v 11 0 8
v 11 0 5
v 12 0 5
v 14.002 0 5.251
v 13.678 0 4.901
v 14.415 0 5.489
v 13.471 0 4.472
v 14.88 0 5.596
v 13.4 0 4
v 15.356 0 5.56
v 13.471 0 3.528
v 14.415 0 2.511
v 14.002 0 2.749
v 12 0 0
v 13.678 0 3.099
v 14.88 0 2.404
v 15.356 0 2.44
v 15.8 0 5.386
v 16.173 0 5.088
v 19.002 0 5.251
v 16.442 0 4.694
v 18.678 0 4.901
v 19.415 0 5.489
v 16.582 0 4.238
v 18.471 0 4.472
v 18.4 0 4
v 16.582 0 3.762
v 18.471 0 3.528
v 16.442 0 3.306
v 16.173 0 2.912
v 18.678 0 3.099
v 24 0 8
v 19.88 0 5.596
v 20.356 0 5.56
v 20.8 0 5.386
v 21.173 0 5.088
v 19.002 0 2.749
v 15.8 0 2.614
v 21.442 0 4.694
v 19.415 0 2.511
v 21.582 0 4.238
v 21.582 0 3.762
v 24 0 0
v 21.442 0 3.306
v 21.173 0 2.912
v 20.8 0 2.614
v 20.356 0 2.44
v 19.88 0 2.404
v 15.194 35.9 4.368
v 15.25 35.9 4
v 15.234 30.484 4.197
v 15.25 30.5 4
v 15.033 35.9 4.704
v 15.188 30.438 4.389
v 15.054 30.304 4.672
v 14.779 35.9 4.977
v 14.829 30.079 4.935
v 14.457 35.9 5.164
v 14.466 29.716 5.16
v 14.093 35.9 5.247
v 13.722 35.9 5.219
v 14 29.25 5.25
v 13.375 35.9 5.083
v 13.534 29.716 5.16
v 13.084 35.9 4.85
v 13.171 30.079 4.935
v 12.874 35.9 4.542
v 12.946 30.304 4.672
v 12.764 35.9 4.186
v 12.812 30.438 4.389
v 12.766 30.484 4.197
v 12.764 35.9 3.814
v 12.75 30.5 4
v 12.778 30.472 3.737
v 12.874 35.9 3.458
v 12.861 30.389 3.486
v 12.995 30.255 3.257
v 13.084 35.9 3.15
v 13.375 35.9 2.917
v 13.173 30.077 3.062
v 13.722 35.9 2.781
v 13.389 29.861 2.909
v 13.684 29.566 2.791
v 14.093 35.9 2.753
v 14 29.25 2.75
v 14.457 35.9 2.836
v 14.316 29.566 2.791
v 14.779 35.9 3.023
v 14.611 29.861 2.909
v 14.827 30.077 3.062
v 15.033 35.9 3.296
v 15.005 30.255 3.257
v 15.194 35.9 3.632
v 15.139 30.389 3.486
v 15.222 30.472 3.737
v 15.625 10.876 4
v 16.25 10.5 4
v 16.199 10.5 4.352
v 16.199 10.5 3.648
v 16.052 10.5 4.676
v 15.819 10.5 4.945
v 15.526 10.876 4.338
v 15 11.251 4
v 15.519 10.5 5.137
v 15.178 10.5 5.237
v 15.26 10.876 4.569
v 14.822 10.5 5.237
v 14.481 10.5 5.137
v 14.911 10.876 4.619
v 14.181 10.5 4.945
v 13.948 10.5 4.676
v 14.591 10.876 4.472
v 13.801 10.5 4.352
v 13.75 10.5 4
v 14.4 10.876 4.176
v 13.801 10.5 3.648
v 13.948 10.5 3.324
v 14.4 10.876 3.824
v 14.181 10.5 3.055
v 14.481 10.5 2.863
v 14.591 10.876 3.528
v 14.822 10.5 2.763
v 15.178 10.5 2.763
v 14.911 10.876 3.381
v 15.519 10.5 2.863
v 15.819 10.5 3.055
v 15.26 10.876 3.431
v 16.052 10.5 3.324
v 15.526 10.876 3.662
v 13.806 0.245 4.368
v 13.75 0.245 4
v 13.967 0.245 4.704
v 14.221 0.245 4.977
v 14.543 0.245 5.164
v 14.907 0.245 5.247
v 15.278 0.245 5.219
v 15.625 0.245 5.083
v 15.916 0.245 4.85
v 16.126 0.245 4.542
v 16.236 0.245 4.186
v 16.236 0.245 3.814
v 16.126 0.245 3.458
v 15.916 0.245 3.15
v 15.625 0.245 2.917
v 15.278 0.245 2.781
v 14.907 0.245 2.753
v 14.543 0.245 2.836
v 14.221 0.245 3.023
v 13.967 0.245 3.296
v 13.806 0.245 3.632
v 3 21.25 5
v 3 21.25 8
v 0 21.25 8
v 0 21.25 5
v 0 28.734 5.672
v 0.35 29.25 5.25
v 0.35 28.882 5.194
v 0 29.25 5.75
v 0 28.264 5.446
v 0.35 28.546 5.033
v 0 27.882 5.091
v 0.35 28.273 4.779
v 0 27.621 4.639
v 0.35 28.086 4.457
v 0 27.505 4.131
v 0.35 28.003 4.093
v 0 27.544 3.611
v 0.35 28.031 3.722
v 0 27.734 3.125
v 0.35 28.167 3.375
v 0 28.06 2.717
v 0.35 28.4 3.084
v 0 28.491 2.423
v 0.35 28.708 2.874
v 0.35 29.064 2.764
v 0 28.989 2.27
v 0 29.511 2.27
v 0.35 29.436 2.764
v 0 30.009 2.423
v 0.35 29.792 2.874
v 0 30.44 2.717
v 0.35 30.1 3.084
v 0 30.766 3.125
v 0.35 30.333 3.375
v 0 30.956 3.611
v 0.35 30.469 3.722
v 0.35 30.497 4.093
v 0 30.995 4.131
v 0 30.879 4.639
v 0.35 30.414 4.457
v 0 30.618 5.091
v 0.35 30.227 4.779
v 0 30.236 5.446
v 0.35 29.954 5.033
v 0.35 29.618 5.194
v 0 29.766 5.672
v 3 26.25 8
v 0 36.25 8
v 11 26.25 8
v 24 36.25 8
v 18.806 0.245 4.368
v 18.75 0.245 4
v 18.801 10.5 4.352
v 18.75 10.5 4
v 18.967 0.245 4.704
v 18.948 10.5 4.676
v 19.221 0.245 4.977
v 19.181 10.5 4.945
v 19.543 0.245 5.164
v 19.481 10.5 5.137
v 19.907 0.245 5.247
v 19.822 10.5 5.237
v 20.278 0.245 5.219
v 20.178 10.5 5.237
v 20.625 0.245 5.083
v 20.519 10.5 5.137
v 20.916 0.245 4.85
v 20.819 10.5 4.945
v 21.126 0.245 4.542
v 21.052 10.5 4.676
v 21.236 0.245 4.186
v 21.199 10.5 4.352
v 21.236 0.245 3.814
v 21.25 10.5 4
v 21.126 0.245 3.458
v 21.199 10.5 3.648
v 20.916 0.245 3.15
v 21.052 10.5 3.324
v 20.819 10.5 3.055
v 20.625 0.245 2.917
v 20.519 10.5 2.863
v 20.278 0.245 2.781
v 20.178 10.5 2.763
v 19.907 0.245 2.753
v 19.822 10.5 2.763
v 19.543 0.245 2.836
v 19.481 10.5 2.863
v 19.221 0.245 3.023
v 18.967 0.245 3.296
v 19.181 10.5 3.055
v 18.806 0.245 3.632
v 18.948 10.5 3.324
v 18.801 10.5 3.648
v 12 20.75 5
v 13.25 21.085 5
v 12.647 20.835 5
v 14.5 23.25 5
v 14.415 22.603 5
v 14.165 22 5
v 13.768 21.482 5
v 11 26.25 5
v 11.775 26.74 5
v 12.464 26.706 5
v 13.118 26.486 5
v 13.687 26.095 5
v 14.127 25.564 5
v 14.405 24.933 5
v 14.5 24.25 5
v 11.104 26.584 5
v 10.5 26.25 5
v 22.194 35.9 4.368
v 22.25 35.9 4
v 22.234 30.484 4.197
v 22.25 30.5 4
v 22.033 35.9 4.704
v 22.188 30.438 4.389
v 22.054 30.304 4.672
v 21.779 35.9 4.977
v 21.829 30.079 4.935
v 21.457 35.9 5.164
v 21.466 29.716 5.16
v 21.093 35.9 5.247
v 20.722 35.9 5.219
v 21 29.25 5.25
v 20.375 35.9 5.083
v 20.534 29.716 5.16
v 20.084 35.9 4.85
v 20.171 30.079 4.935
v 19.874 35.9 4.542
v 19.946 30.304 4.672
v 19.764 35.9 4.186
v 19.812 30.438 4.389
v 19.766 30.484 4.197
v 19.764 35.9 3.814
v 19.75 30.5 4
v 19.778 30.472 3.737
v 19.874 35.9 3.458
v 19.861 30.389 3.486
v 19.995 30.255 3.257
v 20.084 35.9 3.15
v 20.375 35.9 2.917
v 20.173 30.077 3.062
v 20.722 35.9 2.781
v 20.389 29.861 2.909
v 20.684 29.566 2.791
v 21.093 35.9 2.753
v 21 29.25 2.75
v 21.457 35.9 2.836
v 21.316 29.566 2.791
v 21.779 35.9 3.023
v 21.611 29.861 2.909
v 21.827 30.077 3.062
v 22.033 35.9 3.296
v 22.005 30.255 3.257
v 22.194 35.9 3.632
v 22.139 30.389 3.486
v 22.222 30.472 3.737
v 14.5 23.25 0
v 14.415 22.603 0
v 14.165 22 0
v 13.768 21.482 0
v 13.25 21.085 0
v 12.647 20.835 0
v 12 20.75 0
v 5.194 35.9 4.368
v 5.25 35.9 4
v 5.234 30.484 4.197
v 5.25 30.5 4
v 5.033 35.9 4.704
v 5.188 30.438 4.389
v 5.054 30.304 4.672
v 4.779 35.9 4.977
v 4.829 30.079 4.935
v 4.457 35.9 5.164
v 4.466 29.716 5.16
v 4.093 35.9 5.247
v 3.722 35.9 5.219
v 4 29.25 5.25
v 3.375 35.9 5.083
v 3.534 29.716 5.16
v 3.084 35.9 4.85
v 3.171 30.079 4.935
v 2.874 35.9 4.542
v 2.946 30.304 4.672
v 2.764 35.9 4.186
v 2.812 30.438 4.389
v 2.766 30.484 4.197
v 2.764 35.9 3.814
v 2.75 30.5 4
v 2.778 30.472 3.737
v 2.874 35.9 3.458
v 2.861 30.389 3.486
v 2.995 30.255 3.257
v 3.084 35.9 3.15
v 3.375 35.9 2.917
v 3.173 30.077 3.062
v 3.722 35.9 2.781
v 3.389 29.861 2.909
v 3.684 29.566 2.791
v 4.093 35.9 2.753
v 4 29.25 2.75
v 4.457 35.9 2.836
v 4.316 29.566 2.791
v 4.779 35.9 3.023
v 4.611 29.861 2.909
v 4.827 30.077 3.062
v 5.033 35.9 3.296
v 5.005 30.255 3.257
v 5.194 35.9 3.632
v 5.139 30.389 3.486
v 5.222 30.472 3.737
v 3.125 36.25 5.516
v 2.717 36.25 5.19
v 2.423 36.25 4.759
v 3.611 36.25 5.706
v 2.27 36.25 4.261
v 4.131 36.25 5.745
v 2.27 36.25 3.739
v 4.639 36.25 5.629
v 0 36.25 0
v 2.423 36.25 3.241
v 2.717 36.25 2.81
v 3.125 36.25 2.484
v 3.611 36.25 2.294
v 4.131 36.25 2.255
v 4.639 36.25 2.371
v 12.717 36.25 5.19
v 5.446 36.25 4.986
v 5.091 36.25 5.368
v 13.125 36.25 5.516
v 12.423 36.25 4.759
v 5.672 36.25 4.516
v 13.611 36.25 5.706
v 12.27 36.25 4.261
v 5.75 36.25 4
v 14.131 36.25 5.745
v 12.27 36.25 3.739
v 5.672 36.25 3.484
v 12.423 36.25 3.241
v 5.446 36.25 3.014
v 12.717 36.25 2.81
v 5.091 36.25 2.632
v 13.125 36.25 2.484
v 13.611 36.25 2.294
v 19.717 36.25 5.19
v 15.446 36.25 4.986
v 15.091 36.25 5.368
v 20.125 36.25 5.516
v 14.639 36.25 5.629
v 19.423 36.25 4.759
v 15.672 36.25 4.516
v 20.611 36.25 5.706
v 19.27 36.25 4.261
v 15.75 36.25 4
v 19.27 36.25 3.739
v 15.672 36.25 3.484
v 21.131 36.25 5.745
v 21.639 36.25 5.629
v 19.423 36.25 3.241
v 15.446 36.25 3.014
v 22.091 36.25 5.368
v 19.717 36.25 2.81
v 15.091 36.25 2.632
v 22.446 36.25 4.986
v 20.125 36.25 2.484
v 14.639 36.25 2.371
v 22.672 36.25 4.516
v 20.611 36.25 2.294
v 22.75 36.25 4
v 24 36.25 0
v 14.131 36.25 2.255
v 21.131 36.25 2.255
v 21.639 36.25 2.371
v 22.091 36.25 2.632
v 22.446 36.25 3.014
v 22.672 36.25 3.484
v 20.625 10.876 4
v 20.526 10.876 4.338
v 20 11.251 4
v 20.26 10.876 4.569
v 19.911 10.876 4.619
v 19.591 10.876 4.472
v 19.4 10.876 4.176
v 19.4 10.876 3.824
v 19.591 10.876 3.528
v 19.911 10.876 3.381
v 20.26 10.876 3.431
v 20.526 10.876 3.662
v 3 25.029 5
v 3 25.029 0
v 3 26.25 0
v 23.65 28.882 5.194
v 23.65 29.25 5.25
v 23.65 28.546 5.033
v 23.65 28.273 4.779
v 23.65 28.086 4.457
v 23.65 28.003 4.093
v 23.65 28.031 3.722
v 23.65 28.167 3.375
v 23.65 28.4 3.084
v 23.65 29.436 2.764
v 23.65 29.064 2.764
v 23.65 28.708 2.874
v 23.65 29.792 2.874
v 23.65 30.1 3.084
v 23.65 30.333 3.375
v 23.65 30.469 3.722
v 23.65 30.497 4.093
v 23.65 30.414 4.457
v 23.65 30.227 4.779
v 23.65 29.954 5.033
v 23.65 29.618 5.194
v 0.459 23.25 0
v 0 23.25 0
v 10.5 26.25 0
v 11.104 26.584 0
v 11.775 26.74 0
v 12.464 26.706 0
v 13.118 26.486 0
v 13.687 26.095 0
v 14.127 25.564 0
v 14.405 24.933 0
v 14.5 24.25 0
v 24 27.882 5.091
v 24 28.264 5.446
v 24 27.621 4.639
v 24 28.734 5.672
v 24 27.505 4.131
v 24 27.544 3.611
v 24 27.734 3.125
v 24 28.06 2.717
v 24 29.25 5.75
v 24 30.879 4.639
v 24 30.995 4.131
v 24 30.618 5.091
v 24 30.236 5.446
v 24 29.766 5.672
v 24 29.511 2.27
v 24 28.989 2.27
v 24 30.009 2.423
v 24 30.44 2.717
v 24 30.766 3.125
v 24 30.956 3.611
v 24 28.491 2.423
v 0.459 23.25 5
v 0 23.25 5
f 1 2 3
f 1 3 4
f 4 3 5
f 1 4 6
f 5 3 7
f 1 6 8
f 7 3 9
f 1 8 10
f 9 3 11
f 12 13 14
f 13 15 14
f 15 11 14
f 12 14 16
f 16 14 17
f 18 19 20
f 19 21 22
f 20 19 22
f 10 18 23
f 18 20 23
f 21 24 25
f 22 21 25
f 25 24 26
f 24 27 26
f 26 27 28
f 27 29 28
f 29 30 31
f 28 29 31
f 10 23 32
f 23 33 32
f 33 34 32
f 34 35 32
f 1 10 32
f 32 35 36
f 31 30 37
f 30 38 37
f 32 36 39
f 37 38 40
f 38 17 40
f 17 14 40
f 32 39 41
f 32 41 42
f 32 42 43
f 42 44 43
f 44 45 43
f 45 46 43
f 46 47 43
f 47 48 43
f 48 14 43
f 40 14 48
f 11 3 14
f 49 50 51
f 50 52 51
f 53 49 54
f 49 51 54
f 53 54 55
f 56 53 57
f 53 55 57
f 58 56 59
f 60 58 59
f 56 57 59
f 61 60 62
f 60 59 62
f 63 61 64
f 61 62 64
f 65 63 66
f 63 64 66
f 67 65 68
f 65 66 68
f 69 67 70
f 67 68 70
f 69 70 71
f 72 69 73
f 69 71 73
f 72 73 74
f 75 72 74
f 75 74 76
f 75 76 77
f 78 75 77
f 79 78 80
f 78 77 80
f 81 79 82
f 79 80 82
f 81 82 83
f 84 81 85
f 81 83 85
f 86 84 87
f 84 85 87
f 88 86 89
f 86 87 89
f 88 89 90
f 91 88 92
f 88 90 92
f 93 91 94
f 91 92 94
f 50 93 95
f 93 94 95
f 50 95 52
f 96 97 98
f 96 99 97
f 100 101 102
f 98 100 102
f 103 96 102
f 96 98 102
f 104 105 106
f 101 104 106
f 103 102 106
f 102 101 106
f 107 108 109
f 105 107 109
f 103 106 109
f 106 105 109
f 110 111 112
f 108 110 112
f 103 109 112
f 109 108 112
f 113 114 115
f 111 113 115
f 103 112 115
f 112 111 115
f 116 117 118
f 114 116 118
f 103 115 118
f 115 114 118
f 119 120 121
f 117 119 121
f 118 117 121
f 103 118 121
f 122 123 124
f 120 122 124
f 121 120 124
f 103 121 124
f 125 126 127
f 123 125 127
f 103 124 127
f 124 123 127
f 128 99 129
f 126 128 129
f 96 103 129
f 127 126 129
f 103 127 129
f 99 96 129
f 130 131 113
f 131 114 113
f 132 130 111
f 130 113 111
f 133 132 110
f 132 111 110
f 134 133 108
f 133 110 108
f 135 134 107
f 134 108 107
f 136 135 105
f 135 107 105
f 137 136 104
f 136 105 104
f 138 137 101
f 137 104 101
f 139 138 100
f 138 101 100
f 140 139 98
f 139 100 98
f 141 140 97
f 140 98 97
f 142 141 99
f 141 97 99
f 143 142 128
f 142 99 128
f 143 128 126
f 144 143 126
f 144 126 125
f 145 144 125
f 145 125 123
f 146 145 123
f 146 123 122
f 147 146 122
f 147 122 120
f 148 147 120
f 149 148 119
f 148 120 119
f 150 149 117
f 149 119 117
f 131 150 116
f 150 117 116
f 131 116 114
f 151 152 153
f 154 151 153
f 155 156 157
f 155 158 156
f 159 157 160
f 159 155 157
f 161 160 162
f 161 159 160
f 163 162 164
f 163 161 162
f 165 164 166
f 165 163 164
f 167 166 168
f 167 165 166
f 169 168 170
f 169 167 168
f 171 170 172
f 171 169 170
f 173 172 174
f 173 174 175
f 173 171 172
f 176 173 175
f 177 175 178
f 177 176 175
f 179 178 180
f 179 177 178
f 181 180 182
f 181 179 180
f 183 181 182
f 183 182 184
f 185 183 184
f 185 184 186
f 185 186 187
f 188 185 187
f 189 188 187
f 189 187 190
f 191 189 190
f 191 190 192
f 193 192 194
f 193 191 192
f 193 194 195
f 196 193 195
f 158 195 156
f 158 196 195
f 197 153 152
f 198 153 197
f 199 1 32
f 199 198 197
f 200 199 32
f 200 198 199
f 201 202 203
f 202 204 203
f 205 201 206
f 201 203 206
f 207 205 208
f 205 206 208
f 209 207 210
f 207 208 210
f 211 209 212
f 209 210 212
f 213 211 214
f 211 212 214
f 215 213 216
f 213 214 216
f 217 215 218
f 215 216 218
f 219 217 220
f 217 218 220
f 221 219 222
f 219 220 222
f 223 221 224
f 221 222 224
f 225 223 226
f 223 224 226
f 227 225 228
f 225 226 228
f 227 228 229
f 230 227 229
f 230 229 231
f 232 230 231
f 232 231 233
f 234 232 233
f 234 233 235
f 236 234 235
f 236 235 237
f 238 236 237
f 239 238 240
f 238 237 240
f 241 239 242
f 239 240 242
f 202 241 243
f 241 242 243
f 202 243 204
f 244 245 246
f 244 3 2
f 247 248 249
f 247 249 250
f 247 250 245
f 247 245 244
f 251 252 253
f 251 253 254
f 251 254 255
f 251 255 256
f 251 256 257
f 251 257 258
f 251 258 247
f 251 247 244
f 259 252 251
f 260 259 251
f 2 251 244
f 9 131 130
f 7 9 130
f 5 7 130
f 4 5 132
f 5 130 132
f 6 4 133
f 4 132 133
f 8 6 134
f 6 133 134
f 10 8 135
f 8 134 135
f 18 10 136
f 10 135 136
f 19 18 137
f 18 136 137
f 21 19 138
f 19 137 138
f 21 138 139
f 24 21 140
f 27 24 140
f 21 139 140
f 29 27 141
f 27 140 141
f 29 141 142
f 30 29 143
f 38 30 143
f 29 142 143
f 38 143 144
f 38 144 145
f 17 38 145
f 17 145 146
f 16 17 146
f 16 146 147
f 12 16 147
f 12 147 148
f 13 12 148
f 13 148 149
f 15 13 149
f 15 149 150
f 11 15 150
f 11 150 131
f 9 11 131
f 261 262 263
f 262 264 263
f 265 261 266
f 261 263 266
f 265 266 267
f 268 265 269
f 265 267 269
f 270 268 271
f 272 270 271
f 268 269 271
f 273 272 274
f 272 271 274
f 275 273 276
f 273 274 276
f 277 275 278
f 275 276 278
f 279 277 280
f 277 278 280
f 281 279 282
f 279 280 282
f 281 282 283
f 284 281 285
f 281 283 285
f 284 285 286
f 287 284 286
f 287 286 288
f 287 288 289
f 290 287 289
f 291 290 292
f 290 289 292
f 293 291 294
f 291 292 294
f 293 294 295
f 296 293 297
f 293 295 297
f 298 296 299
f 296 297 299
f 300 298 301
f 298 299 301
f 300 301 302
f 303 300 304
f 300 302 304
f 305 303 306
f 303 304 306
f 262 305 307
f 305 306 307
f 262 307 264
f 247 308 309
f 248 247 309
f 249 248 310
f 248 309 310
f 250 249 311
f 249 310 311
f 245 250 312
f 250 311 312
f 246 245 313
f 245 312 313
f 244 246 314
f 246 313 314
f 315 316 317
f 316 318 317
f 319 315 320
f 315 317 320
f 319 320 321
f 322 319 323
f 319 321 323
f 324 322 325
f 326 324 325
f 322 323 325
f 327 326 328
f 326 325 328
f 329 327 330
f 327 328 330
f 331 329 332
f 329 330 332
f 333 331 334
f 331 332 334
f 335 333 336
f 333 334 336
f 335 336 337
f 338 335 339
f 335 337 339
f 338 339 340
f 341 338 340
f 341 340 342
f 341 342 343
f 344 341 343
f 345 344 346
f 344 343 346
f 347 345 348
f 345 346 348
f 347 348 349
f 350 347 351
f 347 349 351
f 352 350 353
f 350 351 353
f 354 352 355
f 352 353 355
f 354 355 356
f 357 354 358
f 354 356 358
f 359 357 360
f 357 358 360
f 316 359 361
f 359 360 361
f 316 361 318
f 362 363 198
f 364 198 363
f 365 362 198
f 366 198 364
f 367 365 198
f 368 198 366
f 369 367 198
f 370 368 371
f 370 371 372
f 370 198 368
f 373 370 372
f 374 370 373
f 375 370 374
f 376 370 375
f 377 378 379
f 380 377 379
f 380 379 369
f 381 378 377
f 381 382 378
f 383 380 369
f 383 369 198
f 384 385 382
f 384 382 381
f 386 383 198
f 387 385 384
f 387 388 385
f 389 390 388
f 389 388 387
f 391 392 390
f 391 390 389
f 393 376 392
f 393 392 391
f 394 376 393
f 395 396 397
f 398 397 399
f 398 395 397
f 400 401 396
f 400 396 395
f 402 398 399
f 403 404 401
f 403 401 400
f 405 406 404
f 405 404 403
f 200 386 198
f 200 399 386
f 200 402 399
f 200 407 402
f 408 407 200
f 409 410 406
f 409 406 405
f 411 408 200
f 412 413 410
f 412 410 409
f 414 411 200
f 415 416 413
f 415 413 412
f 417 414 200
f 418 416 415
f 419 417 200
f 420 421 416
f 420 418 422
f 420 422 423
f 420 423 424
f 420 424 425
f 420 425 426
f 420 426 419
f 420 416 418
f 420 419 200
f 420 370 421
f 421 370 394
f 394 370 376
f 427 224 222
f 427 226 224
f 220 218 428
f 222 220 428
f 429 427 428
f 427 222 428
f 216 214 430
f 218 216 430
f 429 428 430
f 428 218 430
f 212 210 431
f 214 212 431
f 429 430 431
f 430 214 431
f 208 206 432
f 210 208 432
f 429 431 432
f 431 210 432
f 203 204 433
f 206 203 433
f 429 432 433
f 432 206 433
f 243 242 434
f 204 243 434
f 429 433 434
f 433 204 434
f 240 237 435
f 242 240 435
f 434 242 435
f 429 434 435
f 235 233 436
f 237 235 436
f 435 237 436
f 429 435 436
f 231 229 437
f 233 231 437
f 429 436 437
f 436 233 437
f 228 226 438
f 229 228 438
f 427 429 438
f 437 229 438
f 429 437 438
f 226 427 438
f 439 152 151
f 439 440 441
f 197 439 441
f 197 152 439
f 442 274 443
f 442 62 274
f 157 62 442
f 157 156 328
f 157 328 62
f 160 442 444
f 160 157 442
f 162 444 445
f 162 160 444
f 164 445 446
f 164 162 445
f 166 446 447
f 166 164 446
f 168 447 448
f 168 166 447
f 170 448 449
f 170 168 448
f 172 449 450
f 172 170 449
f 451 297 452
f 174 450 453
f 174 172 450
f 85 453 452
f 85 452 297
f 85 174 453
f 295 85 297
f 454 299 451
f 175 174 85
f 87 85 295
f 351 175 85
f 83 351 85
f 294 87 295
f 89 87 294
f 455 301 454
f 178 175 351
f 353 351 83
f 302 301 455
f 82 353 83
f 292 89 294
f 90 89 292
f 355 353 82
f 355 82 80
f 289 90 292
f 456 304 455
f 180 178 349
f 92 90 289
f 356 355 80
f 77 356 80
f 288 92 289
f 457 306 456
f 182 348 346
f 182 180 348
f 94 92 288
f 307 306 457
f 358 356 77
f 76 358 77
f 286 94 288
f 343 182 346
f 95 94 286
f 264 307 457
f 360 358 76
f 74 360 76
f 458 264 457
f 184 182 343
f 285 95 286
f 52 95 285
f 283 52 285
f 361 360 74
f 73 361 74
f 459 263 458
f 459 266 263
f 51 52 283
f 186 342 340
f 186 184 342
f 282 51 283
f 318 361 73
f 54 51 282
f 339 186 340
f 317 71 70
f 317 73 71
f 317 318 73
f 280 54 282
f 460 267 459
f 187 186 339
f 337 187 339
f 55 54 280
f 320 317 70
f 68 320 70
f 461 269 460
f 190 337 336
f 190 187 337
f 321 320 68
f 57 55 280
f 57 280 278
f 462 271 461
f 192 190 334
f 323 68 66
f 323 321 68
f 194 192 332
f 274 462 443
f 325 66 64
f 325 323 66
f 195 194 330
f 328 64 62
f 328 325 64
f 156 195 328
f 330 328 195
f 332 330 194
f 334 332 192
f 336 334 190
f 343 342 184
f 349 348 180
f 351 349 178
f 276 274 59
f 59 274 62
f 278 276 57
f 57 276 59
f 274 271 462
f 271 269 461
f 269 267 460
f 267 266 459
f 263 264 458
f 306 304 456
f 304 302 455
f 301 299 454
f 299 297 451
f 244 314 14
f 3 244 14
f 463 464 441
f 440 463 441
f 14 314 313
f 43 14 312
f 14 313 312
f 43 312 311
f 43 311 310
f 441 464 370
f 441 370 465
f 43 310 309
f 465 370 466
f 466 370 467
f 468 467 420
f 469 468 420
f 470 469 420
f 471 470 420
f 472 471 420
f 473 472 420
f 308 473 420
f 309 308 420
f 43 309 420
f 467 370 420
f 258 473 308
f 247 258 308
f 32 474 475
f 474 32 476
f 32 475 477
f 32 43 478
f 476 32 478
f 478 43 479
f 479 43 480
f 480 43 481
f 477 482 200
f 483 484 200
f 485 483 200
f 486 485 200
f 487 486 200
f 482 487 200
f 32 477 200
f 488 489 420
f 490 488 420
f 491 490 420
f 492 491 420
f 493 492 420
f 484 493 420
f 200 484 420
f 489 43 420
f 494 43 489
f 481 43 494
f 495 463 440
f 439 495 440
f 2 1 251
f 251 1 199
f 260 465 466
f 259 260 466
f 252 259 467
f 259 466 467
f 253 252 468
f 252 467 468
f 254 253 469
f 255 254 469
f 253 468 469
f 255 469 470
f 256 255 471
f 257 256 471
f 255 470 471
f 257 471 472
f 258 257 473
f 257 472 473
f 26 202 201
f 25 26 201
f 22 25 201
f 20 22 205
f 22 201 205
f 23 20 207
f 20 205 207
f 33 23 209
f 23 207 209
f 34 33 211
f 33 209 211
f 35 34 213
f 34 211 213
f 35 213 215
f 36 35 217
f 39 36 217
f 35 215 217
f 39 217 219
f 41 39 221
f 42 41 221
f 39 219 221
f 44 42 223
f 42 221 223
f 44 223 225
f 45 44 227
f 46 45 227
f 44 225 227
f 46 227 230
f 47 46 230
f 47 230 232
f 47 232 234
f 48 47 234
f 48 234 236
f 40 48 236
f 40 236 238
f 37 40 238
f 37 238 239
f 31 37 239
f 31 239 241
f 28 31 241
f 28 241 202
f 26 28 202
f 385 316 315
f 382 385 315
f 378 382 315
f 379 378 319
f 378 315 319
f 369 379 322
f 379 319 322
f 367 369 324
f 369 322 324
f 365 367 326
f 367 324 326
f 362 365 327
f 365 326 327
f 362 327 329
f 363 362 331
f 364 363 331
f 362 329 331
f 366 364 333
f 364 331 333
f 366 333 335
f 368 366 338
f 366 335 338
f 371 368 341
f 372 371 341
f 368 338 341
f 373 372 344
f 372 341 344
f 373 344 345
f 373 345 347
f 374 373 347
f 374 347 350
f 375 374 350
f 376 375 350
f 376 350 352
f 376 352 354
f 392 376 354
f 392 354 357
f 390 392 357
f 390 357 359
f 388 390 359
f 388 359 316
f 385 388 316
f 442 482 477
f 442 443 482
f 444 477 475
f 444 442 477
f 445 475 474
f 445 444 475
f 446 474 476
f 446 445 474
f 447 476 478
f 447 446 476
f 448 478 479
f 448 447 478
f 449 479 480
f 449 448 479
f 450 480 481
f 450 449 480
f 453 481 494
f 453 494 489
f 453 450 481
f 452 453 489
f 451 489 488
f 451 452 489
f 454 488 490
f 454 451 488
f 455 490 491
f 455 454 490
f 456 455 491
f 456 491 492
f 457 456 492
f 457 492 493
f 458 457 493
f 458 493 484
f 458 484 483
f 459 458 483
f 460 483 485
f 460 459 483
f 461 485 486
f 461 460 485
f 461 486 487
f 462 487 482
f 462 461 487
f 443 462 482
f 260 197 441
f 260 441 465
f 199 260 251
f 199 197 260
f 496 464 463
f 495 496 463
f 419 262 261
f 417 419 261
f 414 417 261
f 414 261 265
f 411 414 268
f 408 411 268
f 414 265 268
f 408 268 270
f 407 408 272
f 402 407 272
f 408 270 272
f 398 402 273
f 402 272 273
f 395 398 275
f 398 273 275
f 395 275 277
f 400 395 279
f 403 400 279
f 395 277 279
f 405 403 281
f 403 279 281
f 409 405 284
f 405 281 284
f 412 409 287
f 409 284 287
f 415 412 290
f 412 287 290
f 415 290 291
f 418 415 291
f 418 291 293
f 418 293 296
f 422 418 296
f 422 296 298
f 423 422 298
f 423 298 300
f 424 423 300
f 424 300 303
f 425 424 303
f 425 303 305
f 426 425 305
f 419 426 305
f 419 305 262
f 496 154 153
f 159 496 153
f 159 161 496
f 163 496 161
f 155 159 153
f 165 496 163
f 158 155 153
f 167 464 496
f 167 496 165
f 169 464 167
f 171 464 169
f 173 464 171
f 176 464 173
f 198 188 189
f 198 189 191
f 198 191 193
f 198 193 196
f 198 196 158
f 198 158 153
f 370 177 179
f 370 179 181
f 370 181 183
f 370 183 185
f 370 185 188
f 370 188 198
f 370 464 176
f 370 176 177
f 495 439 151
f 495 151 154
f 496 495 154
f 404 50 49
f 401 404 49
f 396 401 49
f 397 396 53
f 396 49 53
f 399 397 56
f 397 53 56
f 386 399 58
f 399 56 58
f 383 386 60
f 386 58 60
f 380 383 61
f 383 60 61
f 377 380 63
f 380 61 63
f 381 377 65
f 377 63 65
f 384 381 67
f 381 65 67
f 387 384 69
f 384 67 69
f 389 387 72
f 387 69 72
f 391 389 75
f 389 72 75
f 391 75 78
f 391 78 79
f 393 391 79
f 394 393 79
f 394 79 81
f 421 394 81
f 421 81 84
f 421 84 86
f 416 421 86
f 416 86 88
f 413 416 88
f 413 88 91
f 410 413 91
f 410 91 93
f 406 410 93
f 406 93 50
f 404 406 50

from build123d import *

# Parameters (mm, degrees)
SKETCH_1_W                  = 24
SKETCH_1_H                  = 36.25
EXTRUDE_1_DEPTH             = 8
CUT_EXTRUDE_1_DEPTH         = 9
HOLE_WIZARD_M31_D           = 2.5
HOLE_WIZARD_M31_DEPTH       = 10.5
HOLE_WIZARD_M31_CSINK_D     = 3.2
HOLE_WIZARD_M31_CSINK_ANGLE = 110
HOLE_WIZARD_M31_TIP         = 0.751075774
HOLE_WIZARD_M33_D           = 2.5
HOLE_WIZARD_M33_DEPTH       = 7
HOLE_WIZARD_M33_CSINK_D     = 3.5
HOLE_WIZARD_M33_CSINK_ANGLE = 110
HOLE_WIZARD_M33_TIP         = 0.751075774
CUT_EXTRUDE_4_DEPTH         = 5


with BuildPart() as part:
    # Эскиз1 → Бобышка-Вытянуть1 (new body)
    with BuildSketch(Plane.XY):
        with Locations((12, 18.125)):
            Rectangle(SKETCH_1_W, SKETCH_1_H)
    extrude(amount=EXTRUDE_1_DEPTH)

    # Эскиз2 → Вырез-Вытянуть1 (cut, through all)
    with BuildSketch(Plane.XY.offset(8)):
        Polygon((-87.021101005, 21.25), (0, 21.25), (3, 21.25), (3, 26.25), (11, 26.25), (11, 0), (11, -87.021101005), (-118.022033053, -203.828648138), (-216.043134058, -95.557547133), align=None)
    extrude(amount=-CUT_EXTRUDE_1_DEPTH, mode=Mode.SUBTRACT)

    # Отверстие обработанное метчиком M31
    with Locations(Plane.XZ):
        with Locations((15, 4), (20, 4)):
            CounterSinkHole(HOLE_WIZARD_M31_D / 2, HOLE_WIZARD_M31_CSINK_D / 2, depth=HOLE_WIZARD_M31_DEPTH, counter_sink_angle=HOLE_WIZARD_M31_CSINK_ANGLE)
            with Locations((0, 0, -(HOLE_WIZARD_M31_DEPTH + HOLE_WIZARD_M31_TIP / 2))):  # 118° drill point
                Cone(0, HOLE_WIZARD_M31_D / 2, HOLE_WIZARD_M31_TIP, mode=Mode.SUBTRACT)

    # Эскиз6 → Отверстие обработанное метчиком M32 (revolve, cut)
    with BuildSketch(Plane(origin=(0, 29.25, 4), x_dir=(0, 0, 1), z_dir=(0, 1, 0))):
        Polygon((0, 0), (0, 24), (1.75, 24), (1.25, 23.649896231), (1.25, 0.350103769), (1.75, 0), align=None)
    revolve(axis=Axis((-6.35, 29.25, 4), (1, 0, 0)), mode=Mode.SUBTRACT)

    # Отверстие обработанное метчиком M33
    with Locations(Plane(origin=(0, 36.25, 0), x_dir=(-1, 0, 0), z_dir=(0, 1, 0))):
        with Locations((-14, 4), (-4, 4), (-21, 4)):
            CounterSinkHole(HOLE_WIZARD_M33_D / 2, HOLE_WIZARD_M33_CSINK_D / 2, depth=HOLE_WIZARD_M33_DEPTH, counter_sink_angle=HOLE_WIZARD_M33_CSINK_ANGLE)
            with Locations((0, 0, -(HOLE_WIZARD_M33_DEPTH + HOLE_WIZARD_M33_TIP / 2))):  # 118° drill point
                Cone(0, HOLE_WIZARD_M33_D / 2, HOLE_WIZARD_M33_TIP, mode=Mode.SUBTRACT)

    # Эскиз11 → Вырез-Вытянуть4 (cut)
    with BuildSketch(Plane(origin=(0, 0, 0), x_dir=(-1, 0, 0), z_dir=(0, 0, -1))):
        with BuildLine():
            ThreePointArc((-10.5, 26.25), (-13.118033989, 26.486067977), (-14.5, 24.25))
            Line((-14.5, 24.25), (-14.5, 23.25))
            ThreePointArc((-14.5, 23.25), (-13.767766953, 21.482233047), (-12, 20.75))
            Line((-12, 20.75), (-12, 0))
            Line((-12, 0), (-11, 0))
            Line((-11, 0), (-11, 26.25))
            Line((-11, 26.25), (-10.5, 26.25))
        make_face()
        Polygon((-0.459002775, 23.25), (-3, 25.029225411), (-3, 21.25), (0, 21.25), (0, 23.25), align=None)
    extrude(amount=-CUT_EXTRUDE_4_DEPTH, mode=Mode.SUBTRACT)


solid = part.part
